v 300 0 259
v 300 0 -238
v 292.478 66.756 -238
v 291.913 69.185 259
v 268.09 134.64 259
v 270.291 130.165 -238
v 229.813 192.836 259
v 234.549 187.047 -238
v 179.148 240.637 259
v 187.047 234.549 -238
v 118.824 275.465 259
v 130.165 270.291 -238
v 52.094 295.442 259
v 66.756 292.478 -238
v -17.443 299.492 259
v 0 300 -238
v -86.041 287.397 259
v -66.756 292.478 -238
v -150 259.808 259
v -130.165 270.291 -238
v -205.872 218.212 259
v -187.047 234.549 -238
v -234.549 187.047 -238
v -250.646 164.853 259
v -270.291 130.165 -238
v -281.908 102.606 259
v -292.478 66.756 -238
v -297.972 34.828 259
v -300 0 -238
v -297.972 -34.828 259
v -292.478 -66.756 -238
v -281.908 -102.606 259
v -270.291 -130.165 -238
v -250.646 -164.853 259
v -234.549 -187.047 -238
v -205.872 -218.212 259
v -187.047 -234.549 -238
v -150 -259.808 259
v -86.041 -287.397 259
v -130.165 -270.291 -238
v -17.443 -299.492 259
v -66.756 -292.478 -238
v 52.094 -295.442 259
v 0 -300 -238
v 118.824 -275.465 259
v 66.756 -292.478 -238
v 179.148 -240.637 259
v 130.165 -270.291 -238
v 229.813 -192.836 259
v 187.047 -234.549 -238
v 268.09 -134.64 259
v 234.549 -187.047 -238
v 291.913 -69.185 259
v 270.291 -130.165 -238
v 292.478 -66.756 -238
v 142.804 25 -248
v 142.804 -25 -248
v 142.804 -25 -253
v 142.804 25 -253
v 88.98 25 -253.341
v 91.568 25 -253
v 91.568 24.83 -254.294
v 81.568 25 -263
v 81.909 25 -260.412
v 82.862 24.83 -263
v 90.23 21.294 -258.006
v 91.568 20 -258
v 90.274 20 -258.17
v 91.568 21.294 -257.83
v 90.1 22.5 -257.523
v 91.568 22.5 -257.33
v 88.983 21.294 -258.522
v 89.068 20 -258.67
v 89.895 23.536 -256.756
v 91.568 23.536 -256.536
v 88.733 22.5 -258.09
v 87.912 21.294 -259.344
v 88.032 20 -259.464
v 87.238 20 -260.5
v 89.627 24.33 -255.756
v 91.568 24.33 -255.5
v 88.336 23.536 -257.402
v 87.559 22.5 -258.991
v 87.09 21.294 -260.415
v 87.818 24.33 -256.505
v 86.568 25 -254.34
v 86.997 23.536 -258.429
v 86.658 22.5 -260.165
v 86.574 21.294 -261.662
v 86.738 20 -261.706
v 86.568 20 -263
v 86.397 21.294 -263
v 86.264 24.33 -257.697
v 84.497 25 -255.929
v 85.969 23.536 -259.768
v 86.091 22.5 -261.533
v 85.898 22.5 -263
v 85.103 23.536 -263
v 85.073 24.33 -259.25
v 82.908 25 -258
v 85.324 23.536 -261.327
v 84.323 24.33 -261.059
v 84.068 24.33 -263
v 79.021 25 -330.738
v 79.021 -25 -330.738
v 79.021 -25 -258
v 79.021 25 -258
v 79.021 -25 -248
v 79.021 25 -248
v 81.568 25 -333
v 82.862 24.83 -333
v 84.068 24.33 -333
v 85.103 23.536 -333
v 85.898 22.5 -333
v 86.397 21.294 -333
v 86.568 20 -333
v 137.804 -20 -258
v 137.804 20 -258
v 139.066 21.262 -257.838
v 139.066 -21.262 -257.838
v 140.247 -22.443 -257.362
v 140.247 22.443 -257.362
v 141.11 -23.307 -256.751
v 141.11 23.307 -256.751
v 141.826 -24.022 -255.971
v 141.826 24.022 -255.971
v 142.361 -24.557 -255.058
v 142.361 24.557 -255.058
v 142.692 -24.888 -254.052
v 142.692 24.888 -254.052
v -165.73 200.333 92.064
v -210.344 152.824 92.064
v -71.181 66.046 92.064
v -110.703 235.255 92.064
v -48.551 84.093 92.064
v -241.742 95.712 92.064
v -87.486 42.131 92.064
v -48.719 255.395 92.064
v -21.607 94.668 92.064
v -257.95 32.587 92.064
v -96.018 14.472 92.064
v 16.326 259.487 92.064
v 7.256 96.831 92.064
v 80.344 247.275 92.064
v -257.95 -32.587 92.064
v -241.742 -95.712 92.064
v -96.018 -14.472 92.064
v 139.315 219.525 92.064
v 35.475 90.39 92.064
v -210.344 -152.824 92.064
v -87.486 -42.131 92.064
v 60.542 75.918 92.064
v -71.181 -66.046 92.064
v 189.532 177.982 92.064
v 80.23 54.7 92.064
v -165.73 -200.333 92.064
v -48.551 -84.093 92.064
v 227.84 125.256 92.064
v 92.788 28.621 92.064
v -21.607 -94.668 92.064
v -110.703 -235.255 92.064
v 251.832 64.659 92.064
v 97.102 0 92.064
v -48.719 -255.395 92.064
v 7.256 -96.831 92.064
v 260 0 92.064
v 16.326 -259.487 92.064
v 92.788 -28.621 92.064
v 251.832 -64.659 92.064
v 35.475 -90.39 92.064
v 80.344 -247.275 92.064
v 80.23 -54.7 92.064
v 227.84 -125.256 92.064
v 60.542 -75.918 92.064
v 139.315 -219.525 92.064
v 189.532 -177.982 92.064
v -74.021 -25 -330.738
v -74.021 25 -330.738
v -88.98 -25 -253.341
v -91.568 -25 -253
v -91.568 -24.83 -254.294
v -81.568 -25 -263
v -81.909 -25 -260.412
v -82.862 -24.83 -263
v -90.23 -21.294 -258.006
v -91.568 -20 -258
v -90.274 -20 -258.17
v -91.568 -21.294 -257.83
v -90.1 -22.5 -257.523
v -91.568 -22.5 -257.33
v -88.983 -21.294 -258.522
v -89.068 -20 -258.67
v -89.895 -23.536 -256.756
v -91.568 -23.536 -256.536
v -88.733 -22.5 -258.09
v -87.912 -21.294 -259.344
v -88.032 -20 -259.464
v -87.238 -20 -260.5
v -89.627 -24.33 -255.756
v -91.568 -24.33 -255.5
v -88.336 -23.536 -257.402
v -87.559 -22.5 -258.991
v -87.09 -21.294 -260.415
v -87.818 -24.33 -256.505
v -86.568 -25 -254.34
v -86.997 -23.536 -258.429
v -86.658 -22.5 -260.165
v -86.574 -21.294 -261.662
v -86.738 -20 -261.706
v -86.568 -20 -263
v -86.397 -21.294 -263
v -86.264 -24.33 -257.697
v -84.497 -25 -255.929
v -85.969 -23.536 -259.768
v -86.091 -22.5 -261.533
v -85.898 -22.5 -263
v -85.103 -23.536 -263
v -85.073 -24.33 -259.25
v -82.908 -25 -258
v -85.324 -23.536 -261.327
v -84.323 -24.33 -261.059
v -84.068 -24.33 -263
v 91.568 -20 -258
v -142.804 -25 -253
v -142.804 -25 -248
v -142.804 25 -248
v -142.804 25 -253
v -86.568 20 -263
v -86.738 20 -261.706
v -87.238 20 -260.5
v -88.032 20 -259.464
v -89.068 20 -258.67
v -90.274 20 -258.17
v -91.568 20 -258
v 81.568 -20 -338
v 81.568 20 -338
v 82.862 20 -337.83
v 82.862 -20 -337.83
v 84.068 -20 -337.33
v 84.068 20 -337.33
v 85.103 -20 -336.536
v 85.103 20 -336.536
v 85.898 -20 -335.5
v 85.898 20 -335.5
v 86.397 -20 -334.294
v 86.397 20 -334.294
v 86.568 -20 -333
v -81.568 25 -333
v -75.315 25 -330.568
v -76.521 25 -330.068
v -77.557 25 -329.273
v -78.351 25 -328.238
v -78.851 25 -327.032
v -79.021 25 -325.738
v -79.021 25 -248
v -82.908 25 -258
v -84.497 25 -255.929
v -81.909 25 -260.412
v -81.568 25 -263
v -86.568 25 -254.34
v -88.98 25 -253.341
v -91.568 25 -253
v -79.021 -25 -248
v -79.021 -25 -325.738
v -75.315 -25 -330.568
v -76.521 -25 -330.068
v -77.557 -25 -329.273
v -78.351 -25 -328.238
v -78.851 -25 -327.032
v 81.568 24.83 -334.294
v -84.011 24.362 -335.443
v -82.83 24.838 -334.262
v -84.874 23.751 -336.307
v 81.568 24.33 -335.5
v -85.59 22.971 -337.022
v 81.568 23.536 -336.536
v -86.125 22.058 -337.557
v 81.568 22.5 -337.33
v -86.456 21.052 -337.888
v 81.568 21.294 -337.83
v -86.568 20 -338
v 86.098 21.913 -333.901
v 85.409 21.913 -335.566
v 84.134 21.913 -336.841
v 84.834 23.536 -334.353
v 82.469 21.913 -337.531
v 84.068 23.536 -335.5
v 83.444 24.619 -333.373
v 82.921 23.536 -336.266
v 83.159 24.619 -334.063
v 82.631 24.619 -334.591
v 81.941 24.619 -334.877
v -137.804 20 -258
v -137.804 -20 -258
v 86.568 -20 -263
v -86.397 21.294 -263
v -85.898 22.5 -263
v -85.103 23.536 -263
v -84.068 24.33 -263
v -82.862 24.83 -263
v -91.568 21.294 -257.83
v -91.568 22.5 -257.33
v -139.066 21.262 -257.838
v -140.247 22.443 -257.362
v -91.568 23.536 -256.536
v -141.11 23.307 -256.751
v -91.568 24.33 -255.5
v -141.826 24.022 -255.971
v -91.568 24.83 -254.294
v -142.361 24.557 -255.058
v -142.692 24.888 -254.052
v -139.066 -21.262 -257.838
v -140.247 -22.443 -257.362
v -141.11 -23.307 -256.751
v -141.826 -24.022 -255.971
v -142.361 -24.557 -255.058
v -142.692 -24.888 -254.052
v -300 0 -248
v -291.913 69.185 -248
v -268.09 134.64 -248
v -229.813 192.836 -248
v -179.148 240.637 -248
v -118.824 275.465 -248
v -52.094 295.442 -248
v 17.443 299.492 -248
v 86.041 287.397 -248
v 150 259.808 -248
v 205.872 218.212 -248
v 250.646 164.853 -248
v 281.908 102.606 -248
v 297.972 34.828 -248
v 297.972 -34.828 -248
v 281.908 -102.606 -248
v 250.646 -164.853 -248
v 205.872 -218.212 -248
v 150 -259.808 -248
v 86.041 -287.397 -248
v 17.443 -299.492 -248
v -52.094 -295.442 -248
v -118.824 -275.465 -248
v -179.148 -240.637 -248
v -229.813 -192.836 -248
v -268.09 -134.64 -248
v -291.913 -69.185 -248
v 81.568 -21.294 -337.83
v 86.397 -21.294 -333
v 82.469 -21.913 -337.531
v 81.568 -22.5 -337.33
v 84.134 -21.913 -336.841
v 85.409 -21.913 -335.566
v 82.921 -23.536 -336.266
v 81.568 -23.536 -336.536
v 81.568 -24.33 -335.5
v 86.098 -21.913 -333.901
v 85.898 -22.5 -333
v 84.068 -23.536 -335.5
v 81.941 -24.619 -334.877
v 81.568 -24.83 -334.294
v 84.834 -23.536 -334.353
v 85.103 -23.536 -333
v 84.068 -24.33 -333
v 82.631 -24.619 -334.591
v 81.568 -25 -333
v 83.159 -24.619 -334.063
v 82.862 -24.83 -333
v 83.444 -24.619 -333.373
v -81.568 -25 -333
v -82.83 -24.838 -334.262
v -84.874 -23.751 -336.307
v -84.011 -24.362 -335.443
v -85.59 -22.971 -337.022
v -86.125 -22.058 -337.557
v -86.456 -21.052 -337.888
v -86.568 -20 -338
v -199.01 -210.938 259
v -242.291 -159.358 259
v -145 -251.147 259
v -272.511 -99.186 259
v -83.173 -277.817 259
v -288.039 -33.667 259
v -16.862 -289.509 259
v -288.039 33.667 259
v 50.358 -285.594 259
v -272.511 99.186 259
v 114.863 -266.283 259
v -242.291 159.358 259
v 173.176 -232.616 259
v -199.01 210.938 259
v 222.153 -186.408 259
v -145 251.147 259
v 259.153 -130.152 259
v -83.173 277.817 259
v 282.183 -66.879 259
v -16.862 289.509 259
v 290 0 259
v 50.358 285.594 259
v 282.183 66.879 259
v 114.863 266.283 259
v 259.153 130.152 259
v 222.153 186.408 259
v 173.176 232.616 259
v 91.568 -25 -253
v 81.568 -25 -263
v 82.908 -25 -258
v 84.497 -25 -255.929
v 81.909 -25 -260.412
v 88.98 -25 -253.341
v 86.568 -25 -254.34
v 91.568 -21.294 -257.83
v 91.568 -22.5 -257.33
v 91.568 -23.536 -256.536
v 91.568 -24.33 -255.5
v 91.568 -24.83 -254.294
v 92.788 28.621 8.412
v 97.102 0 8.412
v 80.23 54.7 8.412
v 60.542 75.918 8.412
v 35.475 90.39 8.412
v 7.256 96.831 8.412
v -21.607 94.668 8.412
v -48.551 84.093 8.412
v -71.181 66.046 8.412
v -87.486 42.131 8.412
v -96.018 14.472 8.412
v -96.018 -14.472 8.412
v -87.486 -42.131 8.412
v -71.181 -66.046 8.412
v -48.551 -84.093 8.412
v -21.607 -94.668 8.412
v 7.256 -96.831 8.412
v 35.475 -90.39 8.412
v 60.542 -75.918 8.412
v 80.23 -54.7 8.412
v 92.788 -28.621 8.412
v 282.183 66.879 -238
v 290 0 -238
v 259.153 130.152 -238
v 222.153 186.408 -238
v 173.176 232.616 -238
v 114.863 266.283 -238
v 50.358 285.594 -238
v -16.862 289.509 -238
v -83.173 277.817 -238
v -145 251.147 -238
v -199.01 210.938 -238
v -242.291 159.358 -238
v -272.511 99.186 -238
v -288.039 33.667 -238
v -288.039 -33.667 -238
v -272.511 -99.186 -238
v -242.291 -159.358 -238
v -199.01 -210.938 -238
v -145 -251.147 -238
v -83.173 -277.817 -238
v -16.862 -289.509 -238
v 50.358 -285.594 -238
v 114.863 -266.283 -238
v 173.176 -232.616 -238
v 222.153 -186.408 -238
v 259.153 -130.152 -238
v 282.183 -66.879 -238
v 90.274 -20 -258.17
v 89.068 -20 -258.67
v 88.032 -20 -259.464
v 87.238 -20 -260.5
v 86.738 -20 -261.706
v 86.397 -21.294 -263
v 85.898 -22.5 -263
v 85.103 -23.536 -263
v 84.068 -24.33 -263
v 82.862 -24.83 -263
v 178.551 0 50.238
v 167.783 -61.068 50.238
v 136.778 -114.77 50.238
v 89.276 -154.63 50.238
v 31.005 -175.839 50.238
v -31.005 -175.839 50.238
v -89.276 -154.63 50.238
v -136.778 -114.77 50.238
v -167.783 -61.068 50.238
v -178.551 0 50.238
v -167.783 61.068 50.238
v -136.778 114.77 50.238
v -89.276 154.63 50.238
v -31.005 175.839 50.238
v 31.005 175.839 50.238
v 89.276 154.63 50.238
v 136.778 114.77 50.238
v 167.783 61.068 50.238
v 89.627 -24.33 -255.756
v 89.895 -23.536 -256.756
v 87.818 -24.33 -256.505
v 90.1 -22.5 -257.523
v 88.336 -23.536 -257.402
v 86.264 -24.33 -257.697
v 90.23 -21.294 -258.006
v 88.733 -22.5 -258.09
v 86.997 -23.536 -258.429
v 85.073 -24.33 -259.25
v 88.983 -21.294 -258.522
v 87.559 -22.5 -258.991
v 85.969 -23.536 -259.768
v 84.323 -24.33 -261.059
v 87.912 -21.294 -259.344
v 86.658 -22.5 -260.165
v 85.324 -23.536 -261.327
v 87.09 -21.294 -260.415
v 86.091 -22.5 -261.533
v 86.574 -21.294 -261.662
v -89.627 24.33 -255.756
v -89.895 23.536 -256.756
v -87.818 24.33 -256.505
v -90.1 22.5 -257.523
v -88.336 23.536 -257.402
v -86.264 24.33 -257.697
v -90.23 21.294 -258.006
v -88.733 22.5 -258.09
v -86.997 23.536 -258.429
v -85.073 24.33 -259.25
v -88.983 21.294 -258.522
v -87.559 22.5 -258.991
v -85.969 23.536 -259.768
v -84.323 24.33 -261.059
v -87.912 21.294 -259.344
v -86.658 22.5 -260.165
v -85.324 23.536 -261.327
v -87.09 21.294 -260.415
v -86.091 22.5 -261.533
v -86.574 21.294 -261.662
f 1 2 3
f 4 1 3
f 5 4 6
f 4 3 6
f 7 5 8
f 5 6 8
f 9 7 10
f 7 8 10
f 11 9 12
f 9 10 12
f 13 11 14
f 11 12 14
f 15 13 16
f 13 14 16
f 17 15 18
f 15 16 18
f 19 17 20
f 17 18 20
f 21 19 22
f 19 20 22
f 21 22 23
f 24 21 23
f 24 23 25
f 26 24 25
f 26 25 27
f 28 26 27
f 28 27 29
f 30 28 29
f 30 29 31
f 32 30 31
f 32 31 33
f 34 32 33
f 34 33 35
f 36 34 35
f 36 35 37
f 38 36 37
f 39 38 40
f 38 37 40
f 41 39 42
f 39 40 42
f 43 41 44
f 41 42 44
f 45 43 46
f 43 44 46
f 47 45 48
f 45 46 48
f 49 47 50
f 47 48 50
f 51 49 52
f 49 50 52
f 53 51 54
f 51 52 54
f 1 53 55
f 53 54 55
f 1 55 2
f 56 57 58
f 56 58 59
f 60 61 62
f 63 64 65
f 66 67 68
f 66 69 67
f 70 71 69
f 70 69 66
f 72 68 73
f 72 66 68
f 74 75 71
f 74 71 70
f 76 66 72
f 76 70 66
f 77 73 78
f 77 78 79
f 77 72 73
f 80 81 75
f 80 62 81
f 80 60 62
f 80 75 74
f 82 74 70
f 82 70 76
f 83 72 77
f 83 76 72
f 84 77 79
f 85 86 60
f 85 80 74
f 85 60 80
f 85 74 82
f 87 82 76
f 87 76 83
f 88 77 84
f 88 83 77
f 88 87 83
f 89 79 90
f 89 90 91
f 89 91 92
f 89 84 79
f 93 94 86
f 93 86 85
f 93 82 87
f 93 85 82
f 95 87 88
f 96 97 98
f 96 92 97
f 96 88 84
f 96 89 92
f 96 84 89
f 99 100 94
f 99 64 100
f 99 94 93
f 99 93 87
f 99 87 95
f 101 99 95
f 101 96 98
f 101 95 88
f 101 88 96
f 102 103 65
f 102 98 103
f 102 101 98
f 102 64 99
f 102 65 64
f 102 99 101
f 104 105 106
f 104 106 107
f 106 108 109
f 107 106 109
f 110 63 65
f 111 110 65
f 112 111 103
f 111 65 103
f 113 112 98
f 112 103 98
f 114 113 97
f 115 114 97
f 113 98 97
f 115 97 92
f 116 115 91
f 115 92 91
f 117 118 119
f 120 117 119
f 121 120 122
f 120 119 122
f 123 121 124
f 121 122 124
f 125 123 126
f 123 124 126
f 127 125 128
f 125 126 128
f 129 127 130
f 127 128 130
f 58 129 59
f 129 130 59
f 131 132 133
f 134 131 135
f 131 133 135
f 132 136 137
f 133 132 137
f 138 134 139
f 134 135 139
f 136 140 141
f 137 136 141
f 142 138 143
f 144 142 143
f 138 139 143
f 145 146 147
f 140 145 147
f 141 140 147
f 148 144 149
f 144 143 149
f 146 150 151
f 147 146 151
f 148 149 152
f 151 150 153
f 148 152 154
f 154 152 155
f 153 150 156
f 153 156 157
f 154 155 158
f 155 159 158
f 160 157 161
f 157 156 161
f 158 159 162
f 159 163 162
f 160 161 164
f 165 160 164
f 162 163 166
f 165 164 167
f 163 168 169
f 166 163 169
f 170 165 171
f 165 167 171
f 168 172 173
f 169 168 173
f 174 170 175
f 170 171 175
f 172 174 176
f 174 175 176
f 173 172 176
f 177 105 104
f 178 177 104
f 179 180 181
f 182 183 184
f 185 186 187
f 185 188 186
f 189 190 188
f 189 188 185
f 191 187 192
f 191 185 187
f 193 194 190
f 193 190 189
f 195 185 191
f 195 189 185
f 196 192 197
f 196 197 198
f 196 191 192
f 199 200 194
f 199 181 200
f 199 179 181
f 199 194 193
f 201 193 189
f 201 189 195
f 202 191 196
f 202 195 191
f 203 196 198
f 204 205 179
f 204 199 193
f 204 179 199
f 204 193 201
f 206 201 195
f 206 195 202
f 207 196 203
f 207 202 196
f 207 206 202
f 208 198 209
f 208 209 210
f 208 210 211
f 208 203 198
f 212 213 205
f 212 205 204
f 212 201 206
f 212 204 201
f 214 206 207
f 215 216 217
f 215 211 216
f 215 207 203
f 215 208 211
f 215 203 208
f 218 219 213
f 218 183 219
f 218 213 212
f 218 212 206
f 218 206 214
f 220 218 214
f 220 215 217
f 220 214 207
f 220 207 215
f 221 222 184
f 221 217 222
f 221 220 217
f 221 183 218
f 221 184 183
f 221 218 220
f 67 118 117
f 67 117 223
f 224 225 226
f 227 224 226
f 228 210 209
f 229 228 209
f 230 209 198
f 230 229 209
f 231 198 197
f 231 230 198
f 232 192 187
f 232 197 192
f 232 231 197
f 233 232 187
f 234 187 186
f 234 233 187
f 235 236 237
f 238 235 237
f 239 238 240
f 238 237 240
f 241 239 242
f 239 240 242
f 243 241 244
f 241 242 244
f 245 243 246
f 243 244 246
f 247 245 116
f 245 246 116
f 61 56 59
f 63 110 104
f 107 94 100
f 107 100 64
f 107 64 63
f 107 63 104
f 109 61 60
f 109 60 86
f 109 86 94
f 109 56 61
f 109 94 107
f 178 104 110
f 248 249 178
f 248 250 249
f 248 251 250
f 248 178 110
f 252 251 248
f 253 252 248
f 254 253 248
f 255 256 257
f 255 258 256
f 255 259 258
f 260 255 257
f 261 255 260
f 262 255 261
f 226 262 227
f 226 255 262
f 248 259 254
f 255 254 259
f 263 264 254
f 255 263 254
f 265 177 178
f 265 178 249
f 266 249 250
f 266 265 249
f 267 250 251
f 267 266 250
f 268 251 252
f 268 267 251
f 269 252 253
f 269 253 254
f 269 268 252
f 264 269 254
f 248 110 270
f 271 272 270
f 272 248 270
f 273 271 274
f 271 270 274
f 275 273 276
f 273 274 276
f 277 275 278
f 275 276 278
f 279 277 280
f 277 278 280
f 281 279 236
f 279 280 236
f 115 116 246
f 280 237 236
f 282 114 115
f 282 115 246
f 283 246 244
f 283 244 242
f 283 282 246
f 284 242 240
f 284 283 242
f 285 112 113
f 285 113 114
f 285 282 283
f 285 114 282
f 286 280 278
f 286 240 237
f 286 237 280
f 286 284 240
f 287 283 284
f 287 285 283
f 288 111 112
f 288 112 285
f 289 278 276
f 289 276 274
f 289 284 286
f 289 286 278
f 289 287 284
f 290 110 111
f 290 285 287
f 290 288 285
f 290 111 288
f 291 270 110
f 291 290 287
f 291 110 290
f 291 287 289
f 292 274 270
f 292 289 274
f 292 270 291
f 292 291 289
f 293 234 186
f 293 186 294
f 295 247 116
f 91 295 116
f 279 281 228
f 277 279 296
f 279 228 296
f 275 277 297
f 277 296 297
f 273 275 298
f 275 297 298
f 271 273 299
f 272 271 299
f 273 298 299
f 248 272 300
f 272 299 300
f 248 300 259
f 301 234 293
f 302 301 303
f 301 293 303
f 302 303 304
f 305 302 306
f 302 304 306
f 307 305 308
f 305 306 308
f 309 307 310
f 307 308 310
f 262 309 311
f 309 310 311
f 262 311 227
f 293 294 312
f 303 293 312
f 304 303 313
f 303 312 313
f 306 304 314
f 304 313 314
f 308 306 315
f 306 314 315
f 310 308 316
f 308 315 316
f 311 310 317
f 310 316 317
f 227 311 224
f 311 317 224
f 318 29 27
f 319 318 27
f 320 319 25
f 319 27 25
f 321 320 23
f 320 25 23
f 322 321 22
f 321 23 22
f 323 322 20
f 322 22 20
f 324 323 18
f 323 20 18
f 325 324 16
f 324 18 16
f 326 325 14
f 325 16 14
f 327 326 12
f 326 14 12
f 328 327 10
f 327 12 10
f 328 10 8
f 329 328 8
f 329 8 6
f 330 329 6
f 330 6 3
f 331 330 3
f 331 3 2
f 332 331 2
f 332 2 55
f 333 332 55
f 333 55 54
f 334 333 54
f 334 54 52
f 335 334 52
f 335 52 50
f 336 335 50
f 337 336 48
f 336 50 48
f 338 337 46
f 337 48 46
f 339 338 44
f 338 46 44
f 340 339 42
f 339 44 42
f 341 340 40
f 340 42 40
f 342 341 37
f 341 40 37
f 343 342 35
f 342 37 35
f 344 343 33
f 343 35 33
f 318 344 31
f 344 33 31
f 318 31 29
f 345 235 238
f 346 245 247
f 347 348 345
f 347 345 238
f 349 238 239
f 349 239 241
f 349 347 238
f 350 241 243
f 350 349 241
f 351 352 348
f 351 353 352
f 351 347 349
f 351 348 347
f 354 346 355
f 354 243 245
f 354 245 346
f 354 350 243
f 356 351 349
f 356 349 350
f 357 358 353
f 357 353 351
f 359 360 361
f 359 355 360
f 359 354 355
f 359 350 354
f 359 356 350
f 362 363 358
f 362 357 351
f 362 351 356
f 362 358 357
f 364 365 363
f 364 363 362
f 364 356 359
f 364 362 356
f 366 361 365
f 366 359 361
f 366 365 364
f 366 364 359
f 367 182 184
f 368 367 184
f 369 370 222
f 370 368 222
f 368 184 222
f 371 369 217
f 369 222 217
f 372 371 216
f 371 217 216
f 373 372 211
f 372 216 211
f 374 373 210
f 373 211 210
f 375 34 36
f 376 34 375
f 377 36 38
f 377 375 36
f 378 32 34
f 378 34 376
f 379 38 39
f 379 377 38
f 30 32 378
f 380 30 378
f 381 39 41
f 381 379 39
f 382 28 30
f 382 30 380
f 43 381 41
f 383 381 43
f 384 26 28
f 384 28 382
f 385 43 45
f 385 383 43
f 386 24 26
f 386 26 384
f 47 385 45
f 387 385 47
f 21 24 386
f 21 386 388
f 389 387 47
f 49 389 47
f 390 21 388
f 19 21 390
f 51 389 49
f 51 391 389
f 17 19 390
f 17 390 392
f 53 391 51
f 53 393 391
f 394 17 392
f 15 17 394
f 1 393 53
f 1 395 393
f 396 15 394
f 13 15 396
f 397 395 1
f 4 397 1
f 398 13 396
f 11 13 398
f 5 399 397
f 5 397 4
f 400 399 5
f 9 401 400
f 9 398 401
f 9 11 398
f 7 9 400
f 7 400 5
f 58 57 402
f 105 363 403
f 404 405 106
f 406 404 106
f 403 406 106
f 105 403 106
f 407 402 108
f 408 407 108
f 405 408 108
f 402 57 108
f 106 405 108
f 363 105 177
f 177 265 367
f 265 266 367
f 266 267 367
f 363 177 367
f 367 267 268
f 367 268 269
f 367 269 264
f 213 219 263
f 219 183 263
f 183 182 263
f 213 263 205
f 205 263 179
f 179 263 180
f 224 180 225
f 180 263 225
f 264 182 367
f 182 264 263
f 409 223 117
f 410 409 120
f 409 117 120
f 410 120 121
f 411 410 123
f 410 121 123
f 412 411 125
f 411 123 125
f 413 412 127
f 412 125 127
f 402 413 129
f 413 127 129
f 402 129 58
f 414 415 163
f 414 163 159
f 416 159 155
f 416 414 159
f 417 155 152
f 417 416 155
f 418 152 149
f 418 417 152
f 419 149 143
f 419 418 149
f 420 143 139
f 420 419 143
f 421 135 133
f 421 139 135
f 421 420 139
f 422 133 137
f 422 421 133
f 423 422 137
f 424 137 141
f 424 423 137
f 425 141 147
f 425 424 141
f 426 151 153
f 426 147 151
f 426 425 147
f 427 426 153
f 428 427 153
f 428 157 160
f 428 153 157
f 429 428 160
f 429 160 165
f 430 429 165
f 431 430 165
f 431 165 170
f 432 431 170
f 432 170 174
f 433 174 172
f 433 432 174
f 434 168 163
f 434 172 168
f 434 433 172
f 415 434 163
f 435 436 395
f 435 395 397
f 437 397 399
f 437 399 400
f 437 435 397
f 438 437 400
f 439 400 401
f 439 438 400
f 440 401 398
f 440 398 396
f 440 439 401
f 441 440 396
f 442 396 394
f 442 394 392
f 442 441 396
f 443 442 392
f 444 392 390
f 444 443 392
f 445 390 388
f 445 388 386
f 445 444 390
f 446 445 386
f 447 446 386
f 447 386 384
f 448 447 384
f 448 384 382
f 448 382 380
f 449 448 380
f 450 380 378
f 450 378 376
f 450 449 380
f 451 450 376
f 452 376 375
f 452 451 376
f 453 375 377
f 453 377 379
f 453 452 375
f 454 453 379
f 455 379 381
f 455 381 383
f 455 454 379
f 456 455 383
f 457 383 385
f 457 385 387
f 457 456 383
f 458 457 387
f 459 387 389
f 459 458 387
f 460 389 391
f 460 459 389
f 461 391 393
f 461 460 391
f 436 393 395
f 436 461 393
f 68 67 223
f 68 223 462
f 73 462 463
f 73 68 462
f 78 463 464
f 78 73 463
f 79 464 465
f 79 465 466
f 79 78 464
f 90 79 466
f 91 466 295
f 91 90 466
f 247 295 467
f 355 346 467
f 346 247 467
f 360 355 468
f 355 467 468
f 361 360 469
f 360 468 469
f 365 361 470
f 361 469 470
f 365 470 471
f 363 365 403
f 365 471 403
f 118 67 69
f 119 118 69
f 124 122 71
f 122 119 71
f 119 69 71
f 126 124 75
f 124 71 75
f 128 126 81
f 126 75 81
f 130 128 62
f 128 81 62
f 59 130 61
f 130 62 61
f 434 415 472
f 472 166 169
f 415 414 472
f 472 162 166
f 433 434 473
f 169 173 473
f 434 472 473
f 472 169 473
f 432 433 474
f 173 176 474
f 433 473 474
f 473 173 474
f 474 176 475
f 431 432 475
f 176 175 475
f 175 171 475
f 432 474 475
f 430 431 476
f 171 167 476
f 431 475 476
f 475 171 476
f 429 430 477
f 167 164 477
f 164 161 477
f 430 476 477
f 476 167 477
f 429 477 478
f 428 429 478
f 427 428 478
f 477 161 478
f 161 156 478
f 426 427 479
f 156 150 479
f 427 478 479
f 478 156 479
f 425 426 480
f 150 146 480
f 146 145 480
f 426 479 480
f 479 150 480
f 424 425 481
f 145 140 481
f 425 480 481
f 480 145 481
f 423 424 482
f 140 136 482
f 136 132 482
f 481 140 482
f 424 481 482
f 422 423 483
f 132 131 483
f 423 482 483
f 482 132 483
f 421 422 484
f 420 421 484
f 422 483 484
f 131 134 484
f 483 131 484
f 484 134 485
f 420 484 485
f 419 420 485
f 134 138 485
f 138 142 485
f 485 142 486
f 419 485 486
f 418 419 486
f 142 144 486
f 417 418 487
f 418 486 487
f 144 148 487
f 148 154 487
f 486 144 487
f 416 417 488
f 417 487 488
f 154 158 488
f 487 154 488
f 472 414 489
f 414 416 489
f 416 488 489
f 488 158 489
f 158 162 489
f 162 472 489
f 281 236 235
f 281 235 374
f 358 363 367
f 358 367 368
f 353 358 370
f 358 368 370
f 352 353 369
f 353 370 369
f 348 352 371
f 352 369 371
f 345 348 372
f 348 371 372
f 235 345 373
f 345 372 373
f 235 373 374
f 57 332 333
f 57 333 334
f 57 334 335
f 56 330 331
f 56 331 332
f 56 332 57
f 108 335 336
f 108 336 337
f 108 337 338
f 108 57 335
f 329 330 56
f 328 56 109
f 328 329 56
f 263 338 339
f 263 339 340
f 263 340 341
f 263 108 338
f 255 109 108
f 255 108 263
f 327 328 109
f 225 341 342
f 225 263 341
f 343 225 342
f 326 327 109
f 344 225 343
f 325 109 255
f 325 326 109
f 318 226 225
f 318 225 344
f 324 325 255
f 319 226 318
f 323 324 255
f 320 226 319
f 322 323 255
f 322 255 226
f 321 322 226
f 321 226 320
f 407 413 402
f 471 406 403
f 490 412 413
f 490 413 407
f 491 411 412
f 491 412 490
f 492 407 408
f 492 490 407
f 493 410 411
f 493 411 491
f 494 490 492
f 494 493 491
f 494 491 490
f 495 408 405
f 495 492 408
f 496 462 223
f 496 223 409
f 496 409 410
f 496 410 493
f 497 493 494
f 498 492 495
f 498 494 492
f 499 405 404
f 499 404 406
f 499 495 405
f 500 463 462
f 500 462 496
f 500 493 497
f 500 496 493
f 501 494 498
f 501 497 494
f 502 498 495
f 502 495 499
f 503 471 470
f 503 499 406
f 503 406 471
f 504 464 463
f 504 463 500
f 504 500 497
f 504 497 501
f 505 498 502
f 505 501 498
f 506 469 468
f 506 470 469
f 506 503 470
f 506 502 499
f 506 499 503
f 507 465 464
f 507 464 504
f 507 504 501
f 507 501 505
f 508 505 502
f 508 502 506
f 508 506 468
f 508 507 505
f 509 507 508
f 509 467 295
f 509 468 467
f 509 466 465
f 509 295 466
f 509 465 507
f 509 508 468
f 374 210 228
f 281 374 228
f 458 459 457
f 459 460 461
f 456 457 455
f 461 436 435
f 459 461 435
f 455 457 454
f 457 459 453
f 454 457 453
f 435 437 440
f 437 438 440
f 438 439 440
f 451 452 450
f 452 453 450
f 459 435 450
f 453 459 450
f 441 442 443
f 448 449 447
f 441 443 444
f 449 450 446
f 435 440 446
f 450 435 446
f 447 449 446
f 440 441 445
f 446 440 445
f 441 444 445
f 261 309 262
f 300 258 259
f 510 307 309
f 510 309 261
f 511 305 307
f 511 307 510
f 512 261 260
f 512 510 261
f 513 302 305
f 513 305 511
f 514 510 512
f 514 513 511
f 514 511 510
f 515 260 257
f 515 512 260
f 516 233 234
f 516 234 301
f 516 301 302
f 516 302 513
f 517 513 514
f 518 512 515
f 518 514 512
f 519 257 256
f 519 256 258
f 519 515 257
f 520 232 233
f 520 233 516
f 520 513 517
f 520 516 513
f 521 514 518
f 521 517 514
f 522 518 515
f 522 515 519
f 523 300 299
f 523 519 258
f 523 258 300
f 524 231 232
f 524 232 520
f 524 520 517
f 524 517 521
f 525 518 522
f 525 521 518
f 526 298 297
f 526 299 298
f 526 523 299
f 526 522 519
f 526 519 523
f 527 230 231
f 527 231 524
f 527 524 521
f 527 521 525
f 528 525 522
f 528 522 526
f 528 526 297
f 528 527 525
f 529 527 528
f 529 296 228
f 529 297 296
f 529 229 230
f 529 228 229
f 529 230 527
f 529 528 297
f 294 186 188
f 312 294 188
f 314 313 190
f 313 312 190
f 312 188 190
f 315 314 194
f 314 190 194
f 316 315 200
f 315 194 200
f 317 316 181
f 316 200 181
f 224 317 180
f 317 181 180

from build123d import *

# Parameters (mm, degrees)
BOSS_EXTRUDE2_DEPTH      = 259
BOSS_EXTRUDE2_DEPTH_BACK = 238
SKETCH5_R                = 300
SKETCH5_R_2              = 290
CUT_EXTRUDE1_DEPTH       = 186
CUT_EXTRUDE1_DEPTH_BACK  = 76
SKETCH6_R                = 97.102355
SKETCH7_R                = 300
BOSS_EXTRUDE5_DEPTH      = 10
SKETCH8_W                = 63.782423146
SKETCH8_H                = 50
SKETCH8_W_2              = 63.78242
BOSS_EXTRUDE6_DEPTH      = 10
SKETCH9_W                = 7.546412457
SKETCH9_H                = 50
BOSS_EXTRUDE7_DEPTH      = 80
SKETCH10_W               = 7.262070367
SKETCH10_H               = 50
BOSS_EXTRUDE8_DEPTH      = 158.04274
SKETCH13_W               = 7.54641
SKETCH13_H               = 50
BOSS_EXTRUDE9_DEPTH      = 80
FILLET3_R                = 5


with BuildPart() as part:
    # Sketch3 → Revolve2 (revolve)
    with BuildSketch(Plane(origin=(0, 0, 0), x_dir=(1, 0, 0), z_dir=(0, 1, 0))):
        Polygon((0, 41.453192435), (260, -92.06405694), (0, -92.06405694), align=None)
    revolve(axis=Axis((0, 0, 92.06405694), (0, 0, -1)))

    # Sketch6 → Cut-Extrude1 (cut, two sides: drawn at the far end of the back side and taken through both)
    with BuildSketch(Plane.XY.offset(-CUT_EXTRUDE1_DEPTH_BACK)):
        Circle(SKETCH6_R)
    extrude(amount=CUT_EXTRUDE1_DEPTH + CUT_EXTRUDE1_DEPTH_BACK, mode=Mode.SUBTRACT)


with BuildPart() as body_2:
    # Sketch5 → Boss-Extrude2 (new, two sides: drawn at the far end of the back side and taken through both)
    with BuildSketch(Plane.XY.offset(-BOSS_EXTRUDE2_DEPTH_BACK)):
        Circle(SKETCH5_R)
        Circle(SKETCH5_R_2, mode=Mode.SUBTRACT)
    extrude(amount=BOSS_EXTRUDE2_DEPTH + BOSS_EXTRUDE2_DEPTH_BACK)

    # Sketch7 → Boss-Extrude5 (add)
    with BuildSketch(Plane(origin=(0, 0, -238), x_dir=(-1, 0, 0), z_dir=(0, 0, -1))):
        Circle(SKETCH7_R)
    extrude(amount=BOSS_EXTRUDE5_DEPTH)

    # Sketch8 → Boss-Extrude6 (add)
    with BuildSketch(Plane(origin=(0, 0, -248), x_dir=(-1, 0, 0), z_dir=(0, 0, -1))):
        with Locations((-110.912578662, 0)):
            Rectangle(SKETCH8_W, SKETCH8_H)
        with Locations((110.91258, 0)):
            Rectangle(SKETCH8_W_2, SKETCH8_H)
    extrude(amount=BOSS_EXTRUDE6_DEPTH)

    # Sketch9 → Boss-Extrude7 (add)
    with BuildSketch(Plane(origin=(0, 0, -258), x_dir=(-1, 0, 0), z_dir=(0, 0, -1))):
        with Locations((-82.794573318, 0)):
            Rectangle(SKETCH9_W, SKETCH9_H)
    extrude(amount=BOSS_EXTRUDE7_DEPTH)

    # Sketch10 → Boss-Extrude8 (add)
    with BuildSketch(Plane.ZY.offset(-79.021367089)):
        with Locations((-334.368964817, 0)):
            Rectangle(SKETCH10_W, SKETCH10_H)
    extrude(amount=BOSS_EXTRUDE8_DEPTH)

    # Sketch13 → Boss-Extrude9 (add)
    with BuildSketch(Plane(origin=(0, 0, -258), x_dir=(-1, 0, 0), z_dir=(0, 0, -1))):
        with Locations((82.794575, 0)):
            Rectangle(SKETCH13_W, SKETCH13_H)
    extrude(amount=BOSS_EXTRUDE9_DEPTH)

    # Fillet3
    # the kernel refuses this fillet: 5 mm, written as the material it adds along each edge
    with BuildSketch(Plane(origin=(86.567779546, 25, -258), x_dir=(1, 0, 0), z_dir=(0, -1, 0))) as fillet3_piece_1:
        with BuildLine():
            CenterArc((FILLET3_R, -FILLET3_R), FILLET3_R, 90, 90)
            Line((0, -FILLET3_R), (0, 0))
            Line((0, 0), (FILLET3_R, 0))
        make_face()
    fillet3_piece_1_solid = extrude(amount=50, mode=Mode.PRIVATE)
    with BuildSketch(Plane(origin=(-79.02137, -25, -330.737929633), x_dir=(0, 0, 1), z_dir=(0, 1, 0)), Plane(origin=(-86.56778, 25, -258), x_dir=(-1, 0, 0), z_dir=(0, -1, 0))) as fillet3_piece_2:
        with BuildLine():
            CenterArc((FILLET3_R, FILLET3_R), FILLET3_R, 180, 90)
            Line((0, FILLET3_R), (0, 0))
            Line((0, 0), (FILLET3_R, 0))
        make_face()
    fillet3_piece_2_solid = extrude(amount=50, mode=Mode.PRIVATE)
    add([fillet3_piece_1_solid, fillet3_piece_2_solid])
    # the kernel refuses this fillet: 5 mm, written as the material it takes off along each edge
    with BuildSketch(Plane(origin=(142.803790235, 37.5, -258), x_dir=(0, 0, 1), z_dir=(0, -1, 0)), Plane(origin=(-142.80379, -37.5, -258), x_dir=(0, 0, 1), z_dir=(0, 1, 0)), Plane(origin=(86.567779546, 37.5, -338), x_dir=(0, 0, 1), z_dir=(0, -1, 0))) as fillet3_2_piece_1:
        with BuildLine():
            CenterArc((FILLET3_R, FILLET3_R), FILLET3_R, 180, 90)
            Line((0, FILLET3_R), (0, 0))
            Line((0, 0), (FILLET3_R, 0))
        make_face()
    fillet3_2_piece_1_solid = extrude(amount=75, mode=Mode.PRIVATE)
    with BuildSketch(Plane(origin=(79.021367089, 25, -338), x_dir=(0, 0, 1), z_dir=(-1, 0, 0))) as fillet3_2_piece_2:
        with BuildLine():
            CenterArc((FILLET3_R, -FILLET3_R), FILLET3_R, 90, 90)
            Line((0, -FILLET3_R), (0, 0))
            Line((0, 0), (FILLET3_R, 0))
        make_face()
    fillet3_2_piece_2_solid = extrude(amount=158.042737089, mode=Mode.PRIVATE)
    with BuildSketch(Plane(origin=(-79.02137, 25, -338), x_dir=(0, 0, 1), z_dir=(-1, 0, 0))) as fillet3_2_piece_3:
        with BuildLine():
            CenterArc((FILLET3_R, -FILLET3_R), FILLET3_R, 90, 90)
            Line((0, -FILLET3_R), (0, 0))
            Line((0, 0), (FILLET3_R, 0))
        make_face()
    fillet3_2_piece_3_solid = extrude(amount=2.911e-06, mode=Mode.PRIVATE)
    with BuildSketch(Plane(origin=(79.021367089, -25, -338), x_dir=(0, 0, 1), z_dir=(-1, 0, 0))) as fillet3_2_piece_4:
        with BuildLine():
            CenterArc((FILLET3_R, FILLET3_R), FILLET3_R, 180, 90)
            Line((0, FILLET3_R), (0, 0))
            Line((0, 0), (FILLET3_R, 0))
        make_face()
    fillet3_2_piece_4_solid = extrude(amount=158.042737089, mode=Mode.PRIVATE)
    with BuildSketch(Plane(origin=(-79.02137, -25, -338), x_dir=(0, 0, 1), z_dir=(-1, 0, 0))) as fillet3_2_piece_5:
        with BuildLine():
            CenterArc((FILLET3_R, FILLET3_R), FILLET3_R, 180, 90)
            Line((0, FILLET3_R), (0, 0))
            Line((0, 0), (FILLET3_R, 0))
        make_face()
    fillet3_2_piece_5_solid = extrude(amount=2.911e-06, mode=Mode.PRIVATE)
    with BuildSketch(Plane(origin=(99.067779546, -25, -338), x_dir=(0, 0, 1), z_dir=(-1, 0, 0)), Plane(origin=(79.021367089, 25, -338), x_dir=(0, 0, 1), z_dir=(1, 0, 0))) as fillet3_2_piece_6:
        with BuildLine():
            CenterArc((FILLET3_R, FILLET3_R), FILLET3_R, 180, 90)
            Line((0, FILLET3_R), (0, 0))
            Line((0, 0), (FILLET3_R, 0))
        make_face()
    fillet3_2_piece_6_solid = extrude(amount=20.046412458, mode=Mode.PRIVATE)
    with BuildSketch(Plane(origin=(-99.06778, -25, -338), x_dir=(0, 0, 1), z_dir=(1, 0, 0)), Plane(origin=(-79.021372911, 25, -338), x_dir=(0, 0, 1), z_dir=(-1, 0, 0))) as fillet3_2_piece_7:
        with BuildLine():
            CenterArc((FILLET3_R, -FILLET3_R), FILLET3_R, 90, 90)
            Line((0, -FILLET3_R), (0, 0))
            Line((0, 0), (FILLET3_R, 0))
        make_face()
    fillet3_2_piece_7_solid = extrude(amount=20.046407089, mode=Mode.PRIVATE)
    add([fillet3_2_piece_1_solid, fillet3_2_piece_2_solid, fillet3_2_piece_3_solid, fillet3_2_piece_4_solid, fillet3_2_piece_5_solid, fillet3_2_piece_6_solid, fillet3_2_piece_7_solid], mode=Mode.SUBTRACT)
    # the kernel refuses this fillet: 5 mm, written as the material it takes off along each edge
    with BuildSketch(Plane(origin=(81.567779546, -20, -333), x_dir=(1, 0, 0), z_dir=(0, -1, 0))) as fillet3_3_piece_1_section:
        Polygon((0, 0), (FILLET3_R * 1.02, 0), (FILLET3_R * 1.02, -FILLET3_R * 1.02), (0, -FILLET3_R * 1.02), align=None)
    fillet3_3_piece_1 = extrude(amount=FILLET3_R * 1.02, mode=Mode.PRIVATE)
    fillet3_3_piece_1 = fillet3_3_piece_1 - Plane(origin=(81.567779546, -20, -333), x_dir=(-0.7071067811865475, 0, 0.7071067811865475), z_dir=(0, -1, 0)) * Sphere(FILLET3_R, mode=Mode.PRIVATE)
    with BuildSketch(Plane(origin=(81.567779546, 20, -333), x_dir=(1, 0, 0), z_dir=(0, 1, 0))) as fillet3_3_piece_2_section:
        Polygon((0, 0), (FILLET3_R * 1.02, 0), (FILLET3_R * 1.02, FILLET3_R * 1.02), (0, FILLET3_R * 1.02), align=None)
    fillet3_3_piece_2 = extrude(amount=FILLET3_R * 1.02, mode=Mode.PRIVATE)
    fillet3_3_piece_2 = fillet3_3_piece_2 - Plane(origin=(81.567779546, 20, -333), x_dir=(-0.7071067811865475, 0, 0.7071067811865475), z_dir=(0, 1, 0)) * Sphere(FILLET3_R, mode=Mode.PRIVATE)
    with BuildSketch(Plane(origin=(150.303790235, -25, -258), x_dir=(0, 0, 1), z_dir=(-1, 0, 0)), Plane(origin=(91.567779546, 25, -258), x_dir=(0, 0, 1), z_dir=(1, 0, 0))) as fillet3_3_piece_3:
        with BuildLine():
            CenterArc((FILLET3_R, FILLET3_R), FILLET3_R, 180, 90)
            Line((0, FILLET3_R), (0, 0))
            Line((0, 0), (FILLET3_R, 0))
        make_face()
    fillet3_3_piece_3_solid = extrude(amount=58.736010689, mode=Mode.PRIVATE)
    with BuildSketch(Plane(origin=(-150.30379, 25, -258), x_dir=(0, 0, 1), z_dir=(1, 0, 0)), Plane(origin=(-91.56778, -25, -258), x_dir=(0, 0, 1), z_dir=(-1, 0, 0))) as fillet3_3_piece_4:
        with BuildLine():
            CenterArc((FILLET3_R, FILLET3_R), FILLET3_R, 180, 90)
            Line((0, FILLET3_R), (0, 0))
            Line((0, 0), (FILLET3_R, 0))
        make_face()
    fillet3_3_piece_4_solid = extrude(amount=58.73601, mode=Mode.PRIVATE)
    with BuildSketch(Plane(origin=(86.567779546, 25, -263), x_dir=(-1, 0, 0), z_dir=(0, 0, -1))) as fillet3_3_piece_5:
        with BuildLine():
            CenterArc((FILLET3_R, -FILLET3_R), FILLET3_R, 90, 90)
            Line((0, -FILLET3_R), (0, 0))
            Line((0, 0), (FILLET3_R, 0))
        make_face()
    fillet3_3_piece_5_solid = extrude(amount=70, mode=Mode.PRIVATE)
    with BuildSketch(Plane(origin=(86.567779546, -25, -263), x_dir=(-1, 0, 0), z_dir=(0, 0, -1))) as fillet3_3_piece_6:
        with BuildLine():
            CenterArc((FILLET3_R, FILLET3_R), FILLET3_R, 180, 90)
            Line((0, FILLET3_R), (0, 0))
            Line((0, 0), (FILLET3_R, 0))
        make_face()
    fillet3_3_piece_6_solid = extrude(amount=70, mode=Mode.PRIVATE)
    with BuildSketch(Plane(origin=(-86.56778, -25, -263), x_dir=(1, 0, 0), z_dir=(0, 0, -1))) as fillet3_3_piece_7:
        with BuildLine():
            CenterArc((FILLET3_R, -FILLET3_R), FILLET3_R, 90, 90)
            Line((0, -FILLET3_R), (0, 0))
            Line((0, 0), (FILLET3_R, 0))
        make_face()
    fillet3_3_piece_7_solid = extrude(amount=82.5, mode=Mode.PRIVATE)
    with BuildSketch(Plane(origin=(-86.56778, 25, -263), x_dir=(1, 0, 0), z_dir=(0, 0, -1))) as fillet3_3_piece_8:
        with BuildLine():
            CenterArc((FILLET3_R, FILLET3_R), FILLET3_R, 180, 90)
            Line((0, FILLET3_R), (0, 0))
            Line((0, 0), (FILLET3_R, 0))
        make_face()
    fillet3_3_piece_8_solid = extrude(amount=82.5, mode=Mode.PRIVATE)
    with BuildSketch(Plane(origin=(-91.56778, 25, -263), x_dir=(0, 0, 1), z_dir=(-1, 0, 0))) as fillet3_3_piece_9:
        with BuildLine():
            CenterArc((5 + FILLET3_R, -FILLET3_R), FILLET3_R, 90, 90)
            Line((5, -FILLET3_R), (5, 0))
            Line((5, 0), (5 + FILLET3_R, 0))
        make_face()
    fillet3_3_piece_9_solid = revolve(axis=Axis((-91.56778, 25, -263), (0, 1, 0)), revolution_arc=90, mode=Mode.PRIVATE)
    with BuildSketch(Plane(origin=(-91.56778, -25, -263), x_dir=(0, 0, 1), z_dir=(-1, 0, 0))) as fillet3_3_piece_10:
        with BuildLine():
            CenterArc((5 + FILLET3_R, FILLET3_R), FILLET3_R, 180, 90)
            Line((5, FILLET3_R), (5, 0))
            Line((5, 0), (5 + FILLET3_R, 0))
        make_face()
    fillet3_3_piece_10_solid = revolve(axis=Axis((-91.56778, -25, -263), (0, 1, 0)), revolution_arc=90, mode=Mode.PRIVATE)
    with BuildSketch(Plane(origin=(91.567779546, -25, -263), x_dir=(0, 0, 1), z_dir=(1, 0, 0))) as fillet3_3_piece_11:
        with BuildLine():
            CenterArc((5 + FILLET3_R, -FILLET3_R), FILLET3_R, 90, 90)
            Line((5, -FILLET3_R), (5, 0))
            Line((5, 0), (5 + FILLET3_R, 0))
        make_face()
    fillet3_3_piece_11_solid = revolve(axis=Axis((91.567779546, -25, -263), (0, -1, 0)), revolution_arc=90, mode=Mode.PRIVATE)
    with BuildSketch(Plane(origin=(91.567779546, 25, -263), x_dir=(0, 0, 1), z_dir=(1, 0, 0))) as fillet3_3_piece_12:
        with BuildLine():
            CenterArc((5 + FILLET3_R, FILLET3_R), FILLET3_R, 180, 90)
            Line((5, FILLET3_R), (5, 0))
            Line((5, 0), (5 + FILLET3_R, 0))
        make_face()
    fillet3_3_piece_12_solid = revolve(axis=Axis((91.567779546, 25, -263), (0, -1, 0)), revolution_arc=90, mode=Mode.PRIVATE)
    add([fillet3_3_piece_1, fillet3_3_piece_2, fillet3_3_piece_3_solid, fillet3_3_piece_4_solid, fillet3_3_piece_5_solid, fillet3_3_piece_6_solid, fillet3_3_piece_7_solid, fillet3_3_piece_8_solid, fillet3_3_piece_9_solid, fillet3_3_piece_10_solid, fillet3_3_piece_11_solid, fillet3_3_piece_12_solid], mode=Mode.SUBTRACT)


solid = Compound([part.part, body_2.part])
